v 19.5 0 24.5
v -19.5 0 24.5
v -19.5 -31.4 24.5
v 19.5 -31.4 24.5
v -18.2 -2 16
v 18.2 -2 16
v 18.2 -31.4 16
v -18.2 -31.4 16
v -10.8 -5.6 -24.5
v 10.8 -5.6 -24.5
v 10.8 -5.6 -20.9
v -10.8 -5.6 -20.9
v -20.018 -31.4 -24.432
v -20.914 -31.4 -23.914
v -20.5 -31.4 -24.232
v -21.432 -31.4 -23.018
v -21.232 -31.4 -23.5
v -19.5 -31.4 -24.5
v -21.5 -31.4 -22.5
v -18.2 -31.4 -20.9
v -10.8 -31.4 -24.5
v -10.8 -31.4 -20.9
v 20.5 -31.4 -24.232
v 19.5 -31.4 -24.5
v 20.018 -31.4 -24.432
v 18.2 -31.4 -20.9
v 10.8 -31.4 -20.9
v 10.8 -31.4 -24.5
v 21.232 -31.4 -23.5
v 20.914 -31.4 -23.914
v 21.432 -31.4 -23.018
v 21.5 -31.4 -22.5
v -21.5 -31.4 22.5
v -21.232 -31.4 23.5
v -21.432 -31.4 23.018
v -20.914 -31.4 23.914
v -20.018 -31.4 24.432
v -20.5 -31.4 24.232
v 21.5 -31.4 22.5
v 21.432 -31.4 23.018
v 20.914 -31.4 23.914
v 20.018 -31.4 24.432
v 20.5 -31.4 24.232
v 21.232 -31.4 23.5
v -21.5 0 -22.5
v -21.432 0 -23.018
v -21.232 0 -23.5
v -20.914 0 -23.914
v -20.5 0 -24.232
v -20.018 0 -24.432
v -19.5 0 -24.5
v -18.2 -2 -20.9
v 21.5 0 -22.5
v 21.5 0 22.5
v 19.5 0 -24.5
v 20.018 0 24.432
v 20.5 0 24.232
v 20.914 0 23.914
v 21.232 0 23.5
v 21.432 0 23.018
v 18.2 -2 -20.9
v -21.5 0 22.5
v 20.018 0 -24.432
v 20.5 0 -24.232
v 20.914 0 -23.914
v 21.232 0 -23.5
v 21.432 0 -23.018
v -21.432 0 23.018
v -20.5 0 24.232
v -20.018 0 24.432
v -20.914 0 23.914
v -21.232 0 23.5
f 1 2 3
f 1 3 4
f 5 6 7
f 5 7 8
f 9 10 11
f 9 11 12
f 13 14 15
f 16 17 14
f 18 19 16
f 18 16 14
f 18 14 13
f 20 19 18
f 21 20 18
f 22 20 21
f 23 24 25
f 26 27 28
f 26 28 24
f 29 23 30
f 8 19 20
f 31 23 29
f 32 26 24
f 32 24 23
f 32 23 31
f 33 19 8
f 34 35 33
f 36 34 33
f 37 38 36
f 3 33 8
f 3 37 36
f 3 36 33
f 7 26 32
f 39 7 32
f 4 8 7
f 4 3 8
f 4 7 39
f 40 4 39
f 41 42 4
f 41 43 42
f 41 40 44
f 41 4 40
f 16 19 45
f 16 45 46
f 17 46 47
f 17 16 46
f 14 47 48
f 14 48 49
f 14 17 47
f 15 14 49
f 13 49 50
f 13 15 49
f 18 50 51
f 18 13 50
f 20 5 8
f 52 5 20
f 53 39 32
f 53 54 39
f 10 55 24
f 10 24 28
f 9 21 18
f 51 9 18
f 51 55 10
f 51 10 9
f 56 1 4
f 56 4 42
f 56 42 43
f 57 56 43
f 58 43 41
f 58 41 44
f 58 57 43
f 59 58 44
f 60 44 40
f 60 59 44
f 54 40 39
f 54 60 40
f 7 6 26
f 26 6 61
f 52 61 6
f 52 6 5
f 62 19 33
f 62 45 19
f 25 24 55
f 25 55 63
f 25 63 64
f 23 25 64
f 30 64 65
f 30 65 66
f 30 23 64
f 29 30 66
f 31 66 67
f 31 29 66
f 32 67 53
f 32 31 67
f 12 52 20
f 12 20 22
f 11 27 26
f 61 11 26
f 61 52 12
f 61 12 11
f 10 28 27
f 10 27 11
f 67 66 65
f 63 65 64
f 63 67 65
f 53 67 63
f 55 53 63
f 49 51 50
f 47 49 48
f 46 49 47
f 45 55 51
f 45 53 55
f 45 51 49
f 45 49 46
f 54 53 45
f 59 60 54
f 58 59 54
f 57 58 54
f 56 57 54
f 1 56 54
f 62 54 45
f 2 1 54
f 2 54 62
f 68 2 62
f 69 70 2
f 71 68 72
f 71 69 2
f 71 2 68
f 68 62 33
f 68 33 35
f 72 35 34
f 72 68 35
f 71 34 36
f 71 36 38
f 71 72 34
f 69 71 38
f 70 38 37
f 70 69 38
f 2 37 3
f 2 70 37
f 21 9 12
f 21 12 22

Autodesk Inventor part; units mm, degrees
ref_plane "YZ Plane" through (0, 0, 0) normal (1, 0, 0) x (0, 1, 0)
ref_plane "XZ Plane" through (0, 0, 0) normal (0, 1, 0) x (-1, 0, 0)
ref_plane "XY Plane" through (0, 0, 0) normal (0, 0, 1) x (1, 0, 0)
sketch "Sketch1" plane through (0, 0, 0) normal (0, 1, 0) x (-1, 0, 0)
  line L0 (21.5, 24.5) -> (-21.5, 24.5)
  line L1 (-21.5, 24.5) -> (-21.5, -24.5)
  line L2 (-21.5, -24.5) -> (21.5, -24.5)
  line L3 (21.5, -24.5) -> (21.5, 24.5)
  line L4 (21.5, 24.5) -> (-21.5, -24.5) construction
  line L5 (-21.5, 24.5) -> (21.5, -24.5) construction
  point P0 (0, 0)
  dimension "d0" = 43
  dimension "d1" = 49
extrude "Extrusion1" add sketch "Sketch1" against normal blind 2
sketch "Sketch2" plane through (0, -2, 0) normal (0, -1, 0) x (1, 0, 0)
  line L0 (21.5, -24.5) -> (21.5, 24.5) projected
  line L1 (21.5, 24.5) -> (-21.5, 24.5) projected
  line L2 (-21.5, 24.5) -> (-21.5, -24.5) projected
  line L3 (-21.5, -24.5) -> (21.5, -24.5) projected
  line L4 (-21.5, 24.5) -> (-18.2, 24.5)
  line L5 (-18.2, 24.5) -> (-18.2, -24.5)
  line L6 (-18.2, -24.5) -> (-21.5, -24.5)
  line L7 (-21.5, -24.5) -> (-21.5, 24.5)
  line L8 (21.5, 24.5) -> (18.2, 24.5)
  line L9 (18.2, 24.5) -> (18.2, -24.5)
  line L10 (18.2, -24.5) -> (21.5, -24.5)
  line L11 (21.5, -24.5) -> (21.5, 24.5)
  line L12 (-18.2, 24.5) -> (18.2, 24.5)
  line L13 (18.2, 24.5) -> (18.2, 16)
  line L14 (18.2, 16) -> (-18.2, 16)
  line L15 (-18.2, 16) -> (-18.2, 24.5)
  line L16 (18.2, -24.5) -> (-18.2, -24.5)
  line L17 (-18.2, -24.5) -> (-18.2, -20.9)
  line L18 (-18.2, -20.9) -> (18.2, -20.9)
  line L19 (18.2, -20.9) -> (18.2, -24.5)
  point P0 (0, 0)
  point P1 (-18.2, 16)
  point P2 (18.2, -20.9)
  dimension "d4" = 3.3
  dimension "d5" = 3.3
  dimension "d6" = 8.5
  dimension "d7" = 3.6
extrude "Extrusion2" add sketch "Sketch2" along normal blind 29.4 contours L3 L9 L1 L0 | L3 L5 L18 L9 | L9 L14 L5 L1 | L3 L2 L1 L5
sketch "Sketch3" plane through (-21.5, 0, 24.5) normal (0, 0, 1) x (1, 0, 0)
  line L0 (0, 0) -> (43, 0) projected
  line L1 (0, 0) -> (0, -31.4) projected
  line L2 (43, -31.4) -> (0, -31.4) projected
  line L3 (43, 0) -> (43, -31.4) projected
  line L4 (10.7, -31.4) -> (32.3, -31.4)
  line L5 (32.3, -31.4) -> (32.3, -5.6)
  line L6 (32.3, -5.6) -> (10.7, -5.6)
  line L7 (10.7, -5.6) -> (10.7, -31.4)
  point P0 (21.5, 0)
  point P1 (21.5, -31.4)
  dimension "d12" = 21.6
  dimension "d13" = 25.8
  dimension "d14" = 10.8
extrude "Extrusion3" cut sketch "Sketch3" along normal blind 10 from surface at -49 contours L7 L6 L5 L2
fillet "Fillet1" radius 2 4 edges at (21.5, -15.7, 24.5) (21.5, -15.7, -24.5) (-21.5, -15.7, 24.5) (-21.5, -15.7, -24.5)
equation "\"d14\" = 0.5 * d12"
properties part number "encloser_valve-solenoid" material "ABS Plastic"
